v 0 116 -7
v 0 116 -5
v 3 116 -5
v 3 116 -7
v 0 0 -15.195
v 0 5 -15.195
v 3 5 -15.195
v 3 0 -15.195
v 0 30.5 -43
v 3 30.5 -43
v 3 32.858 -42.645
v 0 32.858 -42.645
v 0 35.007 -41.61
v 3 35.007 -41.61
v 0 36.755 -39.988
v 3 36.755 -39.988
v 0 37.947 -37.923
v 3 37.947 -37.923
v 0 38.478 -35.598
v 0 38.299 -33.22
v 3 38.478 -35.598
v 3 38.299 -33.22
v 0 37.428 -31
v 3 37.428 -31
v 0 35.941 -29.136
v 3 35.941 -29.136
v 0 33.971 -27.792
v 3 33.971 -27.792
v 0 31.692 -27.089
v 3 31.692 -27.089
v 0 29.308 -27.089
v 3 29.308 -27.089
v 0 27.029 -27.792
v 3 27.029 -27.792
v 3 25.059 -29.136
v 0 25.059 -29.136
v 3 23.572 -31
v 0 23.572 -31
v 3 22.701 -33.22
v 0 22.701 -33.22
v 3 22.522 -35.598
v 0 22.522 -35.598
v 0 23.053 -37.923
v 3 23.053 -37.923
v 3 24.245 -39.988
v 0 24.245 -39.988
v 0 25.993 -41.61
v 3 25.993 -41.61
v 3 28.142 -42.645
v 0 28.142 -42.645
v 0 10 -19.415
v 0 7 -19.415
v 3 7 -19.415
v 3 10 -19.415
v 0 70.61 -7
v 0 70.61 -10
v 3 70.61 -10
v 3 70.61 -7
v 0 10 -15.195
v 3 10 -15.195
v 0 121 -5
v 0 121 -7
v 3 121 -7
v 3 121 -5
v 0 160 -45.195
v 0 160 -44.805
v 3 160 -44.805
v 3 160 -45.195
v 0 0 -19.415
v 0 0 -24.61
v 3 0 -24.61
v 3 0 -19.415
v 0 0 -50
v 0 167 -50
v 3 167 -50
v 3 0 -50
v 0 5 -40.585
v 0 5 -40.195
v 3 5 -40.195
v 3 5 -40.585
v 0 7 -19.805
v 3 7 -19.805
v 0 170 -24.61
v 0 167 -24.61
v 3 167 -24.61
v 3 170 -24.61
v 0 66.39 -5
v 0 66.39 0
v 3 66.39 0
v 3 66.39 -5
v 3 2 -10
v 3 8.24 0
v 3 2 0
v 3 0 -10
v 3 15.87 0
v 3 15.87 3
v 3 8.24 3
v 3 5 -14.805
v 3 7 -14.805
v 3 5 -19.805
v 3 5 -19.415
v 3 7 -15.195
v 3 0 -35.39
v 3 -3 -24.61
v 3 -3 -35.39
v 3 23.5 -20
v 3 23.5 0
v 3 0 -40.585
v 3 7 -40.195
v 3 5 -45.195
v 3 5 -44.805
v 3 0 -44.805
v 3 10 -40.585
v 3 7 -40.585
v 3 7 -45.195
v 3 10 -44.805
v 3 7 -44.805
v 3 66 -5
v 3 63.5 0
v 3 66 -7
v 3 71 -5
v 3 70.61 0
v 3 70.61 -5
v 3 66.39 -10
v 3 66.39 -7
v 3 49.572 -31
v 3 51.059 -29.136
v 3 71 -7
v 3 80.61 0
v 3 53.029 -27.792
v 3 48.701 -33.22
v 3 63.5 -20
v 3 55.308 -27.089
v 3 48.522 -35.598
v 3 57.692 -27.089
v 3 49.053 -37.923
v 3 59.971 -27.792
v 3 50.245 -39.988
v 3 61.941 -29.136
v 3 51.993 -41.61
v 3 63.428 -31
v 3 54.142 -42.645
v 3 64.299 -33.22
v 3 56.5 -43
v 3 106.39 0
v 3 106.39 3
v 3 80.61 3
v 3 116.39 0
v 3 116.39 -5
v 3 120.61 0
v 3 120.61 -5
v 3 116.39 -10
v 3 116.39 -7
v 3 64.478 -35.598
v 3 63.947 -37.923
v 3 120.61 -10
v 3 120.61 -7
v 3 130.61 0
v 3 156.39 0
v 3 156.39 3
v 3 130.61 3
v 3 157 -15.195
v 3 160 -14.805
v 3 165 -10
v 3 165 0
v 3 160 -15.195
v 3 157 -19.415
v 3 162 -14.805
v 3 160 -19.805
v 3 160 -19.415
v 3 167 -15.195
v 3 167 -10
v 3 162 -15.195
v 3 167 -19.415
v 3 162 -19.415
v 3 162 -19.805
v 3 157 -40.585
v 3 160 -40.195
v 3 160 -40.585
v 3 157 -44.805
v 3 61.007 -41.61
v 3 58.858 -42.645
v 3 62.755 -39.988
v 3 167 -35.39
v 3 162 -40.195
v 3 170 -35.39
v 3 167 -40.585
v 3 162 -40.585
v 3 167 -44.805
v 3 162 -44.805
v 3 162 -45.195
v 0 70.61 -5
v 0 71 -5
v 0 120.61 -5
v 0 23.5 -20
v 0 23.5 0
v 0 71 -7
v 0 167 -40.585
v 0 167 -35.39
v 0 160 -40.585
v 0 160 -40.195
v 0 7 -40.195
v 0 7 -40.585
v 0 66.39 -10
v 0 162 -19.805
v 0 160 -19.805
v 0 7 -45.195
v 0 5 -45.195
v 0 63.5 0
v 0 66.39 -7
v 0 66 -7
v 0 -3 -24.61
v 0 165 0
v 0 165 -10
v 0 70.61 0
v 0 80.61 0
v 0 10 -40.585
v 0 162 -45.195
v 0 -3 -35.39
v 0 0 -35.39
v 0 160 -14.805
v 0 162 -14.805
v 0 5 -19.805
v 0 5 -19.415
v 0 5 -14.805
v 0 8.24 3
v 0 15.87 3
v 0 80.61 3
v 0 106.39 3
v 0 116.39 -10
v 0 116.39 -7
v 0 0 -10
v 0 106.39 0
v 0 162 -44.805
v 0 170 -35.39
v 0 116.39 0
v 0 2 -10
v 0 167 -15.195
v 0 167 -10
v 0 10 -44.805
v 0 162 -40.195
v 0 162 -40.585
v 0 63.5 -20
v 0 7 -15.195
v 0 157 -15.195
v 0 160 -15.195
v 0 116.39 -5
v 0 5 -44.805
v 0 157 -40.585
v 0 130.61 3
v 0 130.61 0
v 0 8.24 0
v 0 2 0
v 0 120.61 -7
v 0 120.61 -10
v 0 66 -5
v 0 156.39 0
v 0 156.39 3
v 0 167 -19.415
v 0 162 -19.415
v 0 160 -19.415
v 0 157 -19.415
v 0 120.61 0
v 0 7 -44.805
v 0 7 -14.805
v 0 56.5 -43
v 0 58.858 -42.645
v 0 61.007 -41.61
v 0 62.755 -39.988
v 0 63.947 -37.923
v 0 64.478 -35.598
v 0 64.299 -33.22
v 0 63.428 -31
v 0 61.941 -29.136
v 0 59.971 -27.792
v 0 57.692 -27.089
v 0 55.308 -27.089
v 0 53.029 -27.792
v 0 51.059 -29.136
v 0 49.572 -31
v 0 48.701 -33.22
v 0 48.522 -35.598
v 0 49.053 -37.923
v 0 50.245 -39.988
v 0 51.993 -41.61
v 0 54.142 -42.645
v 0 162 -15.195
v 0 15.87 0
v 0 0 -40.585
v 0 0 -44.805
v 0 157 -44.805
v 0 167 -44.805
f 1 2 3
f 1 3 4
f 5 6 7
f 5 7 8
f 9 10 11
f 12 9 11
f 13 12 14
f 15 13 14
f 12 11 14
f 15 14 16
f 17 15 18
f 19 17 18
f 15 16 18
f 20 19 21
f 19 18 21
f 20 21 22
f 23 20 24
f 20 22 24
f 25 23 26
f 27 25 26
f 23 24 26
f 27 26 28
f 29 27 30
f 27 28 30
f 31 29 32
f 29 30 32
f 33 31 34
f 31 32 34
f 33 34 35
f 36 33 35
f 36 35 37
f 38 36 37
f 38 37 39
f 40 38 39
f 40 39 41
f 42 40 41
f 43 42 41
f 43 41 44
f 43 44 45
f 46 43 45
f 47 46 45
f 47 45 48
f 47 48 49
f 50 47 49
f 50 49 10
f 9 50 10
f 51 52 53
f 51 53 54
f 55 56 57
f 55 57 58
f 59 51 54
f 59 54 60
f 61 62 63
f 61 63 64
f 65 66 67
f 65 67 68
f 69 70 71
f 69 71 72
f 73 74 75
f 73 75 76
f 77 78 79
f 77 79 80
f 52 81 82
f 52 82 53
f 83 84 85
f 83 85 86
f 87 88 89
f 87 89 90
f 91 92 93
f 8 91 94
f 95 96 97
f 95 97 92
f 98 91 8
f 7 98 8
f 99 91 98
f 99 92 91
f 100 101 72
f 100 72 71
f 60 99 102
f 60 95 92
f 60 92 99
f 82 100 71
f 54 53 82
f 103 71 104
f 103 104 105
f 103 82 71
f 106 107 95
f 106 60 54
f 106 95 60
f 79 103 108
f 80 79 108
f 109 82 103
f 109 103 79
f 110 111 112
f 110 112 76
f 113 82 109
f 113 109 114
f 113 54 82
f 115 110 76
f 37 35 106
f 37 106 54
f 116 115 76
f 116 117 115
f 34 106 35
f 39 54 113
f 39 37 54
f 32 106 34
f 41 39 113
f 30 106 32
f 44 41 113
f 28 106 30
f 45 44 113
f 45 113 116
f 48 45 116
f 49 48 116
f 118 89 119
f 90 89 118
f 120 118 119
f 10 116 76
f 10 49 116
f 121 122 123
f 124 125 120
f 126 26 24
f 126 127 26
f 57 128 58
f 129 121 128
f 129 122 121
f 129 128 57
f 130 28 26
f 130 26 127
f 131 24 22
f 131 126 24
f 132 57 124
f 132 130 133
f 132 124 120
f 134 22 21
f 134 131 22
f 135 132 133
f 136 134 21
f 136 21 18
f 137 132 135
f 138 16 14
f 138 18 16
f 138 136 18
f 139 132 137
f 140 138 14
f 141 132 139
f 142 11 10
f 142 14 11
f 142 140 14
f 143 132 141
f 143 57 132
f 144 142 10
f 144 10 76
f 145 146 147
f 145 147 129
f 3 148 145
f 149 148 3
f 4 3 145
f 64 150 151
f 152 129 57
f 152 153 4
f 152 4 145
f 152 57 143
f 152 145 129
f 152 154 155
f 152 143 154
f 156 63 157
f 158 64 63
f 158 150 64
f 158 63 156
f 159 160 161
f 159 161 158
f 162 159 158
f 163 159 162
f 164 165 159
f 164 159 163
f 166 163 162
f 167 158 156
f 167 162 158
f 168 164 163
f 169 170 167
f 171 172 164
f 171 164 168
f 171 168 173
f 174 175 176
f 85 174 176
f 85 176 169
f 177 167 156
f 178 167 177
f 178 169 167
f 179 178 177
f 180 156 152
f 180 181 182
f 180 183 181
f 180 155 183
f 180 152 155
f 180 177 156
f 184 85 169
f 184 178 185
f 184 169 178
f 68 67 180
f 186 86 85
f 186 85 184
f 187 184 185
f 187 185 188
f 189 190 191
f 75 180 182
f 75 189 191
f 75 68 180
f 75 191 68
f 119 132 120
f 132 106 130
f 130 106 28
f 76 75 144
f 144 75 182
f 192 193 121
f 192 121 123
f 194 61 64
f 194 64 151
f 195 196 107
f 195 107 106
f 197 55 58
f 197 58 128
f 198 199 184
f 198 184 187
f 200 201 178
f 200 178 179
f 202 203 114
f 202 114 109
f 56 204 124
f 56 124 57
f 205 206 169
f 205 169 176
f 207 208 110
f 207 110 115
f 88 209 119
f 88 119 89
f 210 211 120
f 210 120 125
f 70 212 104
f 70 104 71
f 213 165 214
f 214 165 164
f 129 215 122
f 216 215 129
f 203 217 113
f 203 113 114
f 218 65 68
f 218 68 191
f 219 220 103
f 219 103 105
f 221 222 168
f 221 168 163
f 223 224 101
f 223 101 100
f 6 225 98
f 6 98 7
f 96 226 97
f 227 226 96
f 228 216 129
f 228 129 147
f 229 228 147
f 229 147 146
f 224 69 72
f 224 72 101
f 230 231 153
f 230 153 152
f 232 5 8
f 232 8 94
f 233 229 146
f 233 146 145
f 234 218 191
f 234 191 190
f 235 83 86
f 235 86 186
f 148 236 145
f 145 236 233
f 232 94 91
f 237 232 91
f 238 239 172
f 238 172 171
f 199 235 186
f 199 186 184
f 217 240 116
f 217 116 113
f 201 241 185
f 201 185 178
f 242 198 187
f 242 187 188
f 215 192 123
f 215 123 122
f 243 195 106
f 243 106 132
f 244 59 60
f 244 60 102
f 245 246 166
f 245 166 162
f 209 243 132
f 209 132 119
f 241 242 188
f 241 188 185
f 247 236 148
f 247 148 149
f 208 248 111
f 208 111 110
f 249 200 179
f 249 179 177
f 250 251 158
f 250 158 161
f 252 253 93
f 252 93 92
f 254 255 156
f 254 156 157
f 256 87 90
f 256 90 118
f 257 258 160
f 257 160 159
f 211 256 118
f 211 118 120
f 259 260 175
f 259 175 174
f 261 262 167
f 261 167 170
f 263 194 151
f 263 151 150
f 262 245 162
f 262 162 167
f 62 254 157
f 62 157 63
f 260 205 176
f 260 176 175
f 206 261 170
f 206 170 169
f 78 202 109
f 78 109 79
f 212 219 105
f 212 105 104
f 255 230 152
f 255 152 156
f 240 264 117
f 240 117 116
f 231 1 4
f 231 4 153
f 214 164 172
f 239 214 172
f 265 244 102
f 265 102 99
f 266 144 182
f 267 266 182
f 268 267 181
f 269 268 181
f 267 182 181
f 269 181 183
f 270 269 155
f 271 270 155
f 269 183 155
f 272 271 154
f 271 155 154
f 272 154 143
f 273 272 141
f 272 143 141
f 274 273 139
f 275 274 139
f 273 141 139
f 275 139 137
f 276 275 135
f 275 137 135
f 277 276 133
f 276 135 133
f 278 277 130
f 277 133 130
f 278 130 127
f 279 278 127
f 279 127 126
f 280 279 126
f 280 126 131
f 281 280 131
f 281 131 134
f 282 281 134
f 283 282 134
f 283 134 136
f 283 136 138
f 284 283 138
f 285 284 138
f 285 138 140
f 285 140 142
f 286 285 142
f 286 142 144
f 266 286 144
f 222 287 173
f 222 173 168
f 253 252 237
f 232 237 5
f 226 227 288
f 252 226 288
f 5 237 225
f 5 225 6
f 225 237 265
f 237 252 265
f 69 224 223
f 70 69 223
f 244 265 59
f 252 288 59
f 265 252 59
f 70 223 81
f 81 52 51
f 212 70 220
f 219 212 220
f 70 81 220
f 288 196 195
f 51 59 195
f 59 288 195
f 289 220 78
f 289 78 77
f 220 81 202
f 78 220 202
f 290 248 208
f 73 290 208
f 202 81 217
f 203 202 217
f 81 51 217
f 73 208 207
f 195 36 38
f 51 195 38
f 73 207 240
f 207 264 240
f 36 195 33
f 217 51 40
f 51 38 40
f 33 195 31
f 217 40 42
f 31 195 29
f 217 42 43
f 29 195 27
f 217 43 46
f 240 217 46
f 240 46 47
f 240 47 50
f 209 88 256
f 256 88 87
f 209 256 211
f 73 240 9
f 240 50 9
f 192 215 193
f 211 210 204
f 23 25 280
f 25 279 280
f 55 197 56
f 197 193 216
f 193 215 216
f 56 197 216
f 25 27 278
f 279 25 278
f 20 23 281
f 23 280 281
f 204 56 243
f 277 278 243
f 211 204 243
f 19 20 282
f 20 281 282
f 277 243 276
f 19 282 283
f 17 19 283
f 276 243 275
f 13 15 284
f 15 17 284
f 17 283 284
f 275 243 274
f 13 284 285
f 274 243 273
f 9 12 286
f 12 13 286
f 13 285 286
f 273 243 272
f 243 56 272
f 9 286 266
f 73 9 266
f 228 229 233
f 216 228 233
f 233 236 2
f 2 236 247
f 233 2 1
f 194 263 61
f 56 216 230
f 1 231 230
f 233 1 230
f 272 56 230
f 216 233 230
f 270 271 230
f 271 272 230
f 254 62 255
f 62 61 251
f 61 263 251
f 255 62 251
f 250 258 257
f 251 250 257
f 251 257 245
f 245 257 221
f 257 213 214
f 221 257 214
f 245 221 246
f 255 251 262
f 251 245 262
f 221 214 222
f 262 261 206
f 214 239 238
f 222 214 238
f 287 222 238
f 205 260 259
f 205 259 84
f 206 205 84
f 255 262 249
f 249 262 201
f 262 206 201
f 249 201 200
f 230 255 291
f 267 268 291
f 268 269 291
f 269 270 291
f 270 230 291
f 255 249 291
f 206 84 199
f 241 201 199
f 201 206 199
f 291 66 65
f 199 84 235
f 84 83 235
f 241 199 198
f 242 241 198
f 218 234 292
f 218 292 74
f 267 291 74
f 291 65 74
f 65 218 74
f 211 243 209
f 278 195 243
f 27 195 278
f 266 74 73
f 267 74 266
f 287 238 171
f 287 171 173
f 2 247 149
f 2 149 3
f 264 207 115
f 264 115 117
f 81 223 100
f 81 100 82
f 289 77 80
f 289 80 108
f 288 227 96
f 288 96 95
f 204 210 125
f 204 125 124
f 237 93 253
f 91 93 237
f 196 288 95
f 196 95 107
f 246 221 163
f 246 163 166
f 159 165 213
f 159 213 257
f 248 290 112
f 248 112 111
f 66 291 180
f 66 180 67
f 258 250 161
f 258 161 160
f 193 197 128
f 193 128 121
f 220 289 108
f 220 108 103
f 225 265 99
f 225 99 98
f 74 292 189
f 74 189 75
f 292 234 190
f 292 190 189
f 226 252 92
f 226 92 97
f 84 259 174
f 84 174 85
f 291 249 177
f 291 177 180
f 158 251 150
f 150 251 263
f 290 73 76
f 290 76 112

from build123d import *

# Parameters (mm, degrees)
BOSS_EXTRUDE1_DEPTH = 3
SKETCH2_W           = 10
SKETCH2_H           = 2
CUT_EXTRUDE1_DEPTH  = 3
BOSS_EXTRUDE3_DEPTH = 3
SKETCH4_W           = 10
SKETCH4_H           = 2
CUT_EXTRUDE2_DEPTH  = 4
SKETCH5_R           = 8
CUT_EXTRUDE3_DEPTH  = 10


with BuildPart() as part:
    # Sketch1 → Boss-Extrude1 (new body)
    with BuildSketch(Plane(origin=(0, 0, 0), x_dir=(0, 0, -1), z_dir=(1, 0, 0))):
        Polygon((-3, 80.61), (-3, 106.39), (0, 106.39), (0, 113.14), (0, 116.39), (5, 116.39), (5, 116), (7, 116), (7, 116.39), (10, 116.39), (10, 120.61), (7, 120.61), (7, 121), (5, 121), (5, 120.61), (0, 120.61), (0, 124.11), (0, 130.61), (-3, 130.61), (-3, 156.39), (0, 156.39), (0, 159.89), (5, 159.89), (5, 159.5), (7, 159.5), (7, 159.89), (10, 159.89), (10, 164.11), (7, 164.11), (7, 164.5), (5, 164.5), (5, 164.11), (0, 164.11), (0, 167), (15.195, 167), (15.195, 162), (14.805, 162), (14.805, 160), (15.195, 160), (15.195, 157), (19.415, 157), (19.415, 160), (19.805, 160), (19.805, 162), (19.415, 162), (19.415, 167), (24.61, 167), (24.61, 170), (35.39, 170), (35.39, 167), (40.585, 167), (40.585, 162), (40.195, 162), (40.195, 160), (40.585, 160), (40.585, 157), (44.805, 157), (44.805, 160), (45.195, 160), (45.195, 162), (44.805, 162), (44.805, 167), (50, 167), (50, 0), (44.805, 0), (44.805, 5), (45.195, 5), (45.195, 7), (44.805, 7), (44.805, 10), (40.585, 10), (40.585, 7), (40.195, 7), (40.195, 5), (40.585, 5), (40.585, 0), (35.39, 0), (35.39, -3), (24.61, -3), (24.61, 0), (19.415, 0), (19.415, 5), (19.805, 5), (19.805, 7), (19.415, 7), (19.415, 10), (15.195, 10), (15.195, 7), (14.805, 7), (14.805, 5), (15.195, 5), (15.195, 0), (0, 0), (0, 8.24), (-3, 8.24), (-3, 15.87), (0, 15.87), (0, 23.5), (20, 23.5), (20, 63.5), (0, 63.5), (0, 66.39), (5, 66.39), (5, 66), (7, 66), (7, 66.39), (10, 66.39), (10, 70.61), (7, 70.61), (7, 71), (5, 71), (5, 70.61), (0, 70.61), (0, 80.61), align=None)
    extrude(amount=BOSS_EXTRUDE1_DEPTH)

    # Sketch2 → Cut-Extrude1 (cut)
    with BuildSketch(Plane(origin=(3, 0, 0), x_dir=(0, 0, -1), z_dir=(1, 0, 0))):
        with Locations((5, 1)):
            Rectangle(SKETCH2_W, SKETCH2_H)
    extrude(amount=-CUT_EXTRUDE1_DEPTH, mode=Mode.SUBTRACT)

    # Sketch3 → Boss-Extrude3 (add, through all)
    with BuildSketch(Plane(origin=(3, 0, 0), x_dir=(0, 0, -1), z_dir=(1, 0, 0))):
        Polygon((0, 164.11), (0, 159.89), (5, 159.89), (5, 159.5), (7, 159.5), (7, 159.89), (10, 159.89), (10, 164.11), (7, 164.11), (7, 164.5), (5, 164.5), (5, 164.11), align=None)
    extrude(amount=-BOSS_EXTRUDE3_DEPTH)

    # Sketch4 → Cut-Extrude2 (cut, through all)
    with BuildSketch(Plane(origin=(3, 0, 0), x_dir=(0, 0, -1), z_dir=(1, 0, 0))):
        with Locations((5, 166)):
            Rectangle(SKETCH4_W, SKETCH4_H)
    extrude(amount=-CUT_EXTRUDE2_DEPTH, mode=Mode.SUBTRACT)

    # Sketch5 → Cut-Extrude3 (cut)
    with BuildSketch(Plane(origin=(3, 0, 0), x_dir=(0, 0, -1), z_dir=(1, 0, 0))):
        with Locations((35, 30.5)):
            Circle(SKETCH5_R)
        with Locations((35, 56.5)):
            Circle(SKETCH5_R)
    extrude(amount=-CUT_EXTRUDE3_DEPTH, mode=Mode.SUBTRACT)


solid = part.part
